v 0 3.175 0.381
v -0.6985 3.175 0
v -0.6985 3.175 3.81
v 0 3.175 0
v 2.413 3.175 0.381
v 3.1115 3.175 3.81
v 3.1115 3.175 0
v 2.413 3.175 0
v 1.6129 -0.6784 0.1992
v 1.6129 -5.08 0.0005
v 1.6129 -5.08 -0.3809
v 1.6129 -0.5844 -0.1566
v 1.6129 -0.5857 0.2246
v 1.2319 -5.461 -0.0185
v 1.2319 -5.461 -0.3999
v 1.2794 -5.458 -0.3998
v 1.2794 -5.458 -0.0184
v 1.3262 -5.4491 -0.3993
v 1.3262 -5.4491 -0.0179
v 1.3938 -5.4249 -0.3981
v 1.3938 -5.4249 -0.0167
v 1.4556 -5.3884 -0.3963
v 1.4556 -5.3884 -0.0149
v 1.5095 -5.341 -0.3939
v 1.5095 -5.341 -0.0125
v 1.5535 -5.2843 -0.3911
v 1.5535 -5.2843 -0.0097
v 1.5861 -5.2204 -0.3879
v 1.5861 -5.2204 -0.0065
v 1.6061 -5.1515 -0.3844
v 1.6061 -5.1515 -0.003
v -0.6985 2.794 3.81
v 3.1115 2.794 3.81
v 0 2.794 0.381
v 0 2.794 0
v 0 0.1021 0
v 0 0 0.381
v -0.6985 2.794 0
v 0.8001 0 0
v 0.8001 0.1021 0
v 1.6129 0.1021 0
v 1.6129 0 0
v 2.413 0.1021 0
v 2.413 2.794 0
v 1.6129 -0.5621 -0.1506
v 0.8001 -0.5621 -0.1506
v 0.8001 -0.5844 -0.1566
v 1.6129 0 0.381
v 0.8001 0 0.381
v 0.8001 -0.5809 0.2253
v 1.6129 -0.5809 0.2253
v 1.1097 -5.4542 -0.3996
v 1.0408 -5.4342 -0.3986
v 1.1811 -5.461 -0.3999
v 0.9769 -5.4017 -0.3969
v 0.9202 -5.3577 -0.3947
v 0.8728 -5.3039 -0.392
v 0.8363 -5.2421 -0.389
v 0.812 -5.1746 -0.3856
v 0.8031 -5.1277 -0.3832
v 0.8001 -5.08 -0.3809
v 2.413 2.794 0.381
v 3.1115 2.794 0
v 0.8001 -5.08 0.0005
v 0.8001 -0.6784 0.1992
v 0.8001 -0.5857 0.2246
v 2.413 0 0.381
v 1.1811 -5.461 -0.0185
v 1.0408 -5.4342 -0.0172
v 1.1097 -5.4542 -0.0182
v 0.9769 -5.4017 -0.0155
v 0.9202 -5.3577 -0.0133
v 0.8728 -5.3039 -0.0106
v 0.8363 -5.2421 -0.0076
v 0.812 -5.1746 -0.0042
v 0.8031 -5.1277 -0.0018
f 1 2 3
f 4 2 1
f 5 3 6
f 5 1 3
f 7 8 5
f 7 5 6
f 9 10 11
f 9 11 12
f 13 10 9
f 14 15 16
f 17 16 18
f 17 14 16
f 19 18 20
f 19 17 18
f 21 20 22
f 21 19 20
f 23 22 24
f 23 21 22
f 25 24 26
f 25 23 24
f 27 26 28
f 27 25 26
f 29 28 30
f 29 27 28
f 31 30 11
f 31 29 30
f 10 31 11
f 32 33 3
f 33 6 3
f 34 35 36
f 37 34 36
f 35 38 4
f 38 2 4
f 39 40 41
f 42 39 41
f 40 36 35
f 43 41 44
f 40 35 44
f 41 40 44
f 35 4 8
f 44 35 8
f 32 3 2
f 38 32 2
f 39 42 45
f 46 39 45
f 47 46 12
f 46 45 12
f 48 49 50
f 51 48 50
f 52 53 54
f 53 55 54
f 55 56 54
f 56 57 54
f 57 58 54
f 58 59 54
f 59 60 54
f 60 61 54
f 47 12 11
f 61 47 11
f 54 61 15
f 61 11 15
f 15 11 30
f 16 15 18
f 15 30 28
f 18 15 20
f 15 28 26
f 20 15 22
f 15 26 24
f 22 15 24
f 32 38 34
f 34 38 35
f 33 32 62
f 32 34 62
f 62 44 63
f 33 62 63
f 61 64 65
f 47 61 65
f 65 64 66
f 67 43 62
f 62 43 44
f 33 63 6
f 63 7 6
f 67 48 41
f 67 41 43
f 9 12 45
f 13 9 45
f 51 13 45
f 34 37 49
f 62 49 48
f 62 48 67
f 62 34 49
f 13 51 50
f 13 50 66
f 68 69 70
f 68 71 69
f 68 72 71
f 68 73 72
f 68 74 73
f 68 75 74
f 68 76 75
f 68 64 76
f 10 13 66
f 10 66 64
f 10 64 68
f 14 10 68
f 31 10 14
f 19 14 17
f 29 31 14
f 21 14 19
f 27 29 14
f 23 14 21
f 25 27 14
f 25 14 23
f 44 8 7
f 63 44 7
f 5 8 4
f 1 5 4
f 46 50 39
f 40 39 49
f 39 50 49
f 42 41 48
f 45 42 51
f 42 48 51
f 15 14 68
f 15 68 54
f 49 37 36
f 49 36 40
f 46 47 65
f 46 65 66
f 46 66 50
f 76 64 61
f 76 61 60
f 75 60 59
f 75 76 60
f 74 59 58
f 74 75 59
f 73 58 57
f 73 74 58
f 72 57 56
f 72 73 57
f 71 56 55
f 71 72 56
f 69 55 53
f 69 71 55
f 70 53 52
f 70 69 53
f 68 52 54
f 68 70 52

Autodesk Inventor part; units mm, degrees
ref_plane "YZ Plane" through (0, 0, 0) normal (1, 0, 0) x (0, 1, 0)
ref_plane "XZ Plane" through (0, 0, 0) normal (0, 1, 0) x (-1, 0, 0)
ref_plane "XY Plane" through (0, 0, 0) normal (0, 0, 1) x (1, 0, 0)
sketch "Sketch1" plane through (0, 0, 0) normal (0, 0, 1) x (1, 0, 0)
  line L0 (0, 0) -> (2.413, 0)
  line L1 (2.413, 0) -> (2.413, 3.175)
  line L2 (2.413, 3.175) -> (0, 3.175)
  line L3 (0, 3.175) -> (0, 0)
  dimension "d0" = 2.413
  dimension "d1" = 3.175
extrude "Extrusion1" add sketch "Sketch1" along normal blind 0.381
sketch "Sketch2" plane through (2.413, 0, 0) normal (1, 0, 0) x (0, 0, -1)
  line L0 (0, 3.175) -> (-0.381, 3.175) projected
  line L1 (0, 0) -> (-0.381, 0) projected
  line L2 (-0.381, 0) -> (-0.2241, -0.5857)
  line L3 (0, 0) -> (0.1569, -0.5857)
  line L4 (-0.2253, -0.5809) -> (0.0185, -5.461)
  line L5 (0.1562, -0.5831) -> (0.3999, -5.461)
  line L6 (-0.381, 0) -> (-0.381, 3.175) projected
  line L7 (0.0185, -5.461) -> (0.3999, -5.461)
  dimension "d5" = 0.381
  dimension "d6" = 8.636
extrude "Extrusion2" add sketch "Sketch2" against normal up to surface (2.413 mm away)
sketch "Sketch3" plane through (2.413, -5.461, -0.0185) normal (0, -0.0499, 0.9988) x (1, 0, 0)
  line L0 (-2.413, 4.8862) -> (-2.413, 0) projected
  line L1 (0, 4.8862) -> (-2.413, 4.8862) projected
  line L2 (-2.413, 5.4741) -> (0, 5.4741) projected
  line L3 (-2.413, -0.5509) -> (-1.6129, -0.5509)
  line L4 (-1.6129, -0.5509) -> (-1.6129, 4.8862)
  line L5 (-1.6129, 5.4741) -> (-2.413, 5.4741)
  line L6 (-2.413, 4.8862) -> (-2.413, -0.5509)
  line L7 (-0.4584, 5.4741) -> (0, 5.4741)
  line L8 (0, 5.4741) -> (0, 0)
  line L9 (-0.8001, -0.511) -> (0, -0.511)
  line L10 (-0.8001, -0.511) -> (-0.8001, 4.8862)
  line L11 (0, 4.8862) -> (0, -0.511)
  line L12 (-0.8001, 4.8862) -> (0, 4.8862)
  line L13 (-1.6129, 4.8862) -> (-2.413, 4.8862)
  point P0 (-2.413, 5.4551)
  dimension "d9" = 0.8128
  dimension "d10" = 2.413
  dimension "d11" = 0.8001
extrude "Extrusion3" cut sketch "Sketch3" against normal through all
sketch "Sketch4" plane through (0, 0, 0.381) normal (0, -0.2588, 0.9659) x (1, 0, 0)
  line L0 (0, 0) -> (2.413, 0) projected
  line L1 (1.6129, -0.7023) -> (2.413, -0.7023)
  line L2 (2.413, -0.7023) -> (2.413, 0)
  line L3 (2.413, 0) -> (1.6129, 0)
  line L4 (1.6129, 0) -> (1.6129, -0.7023)
  line L5 (0, -0.7023) -> (0.8001, -0.7023)
  line L6 (0.8001, -0.7023) -> (0.8001, 0)
  line L7 (0.8001, 0) -> (0, 0)
  line L8 (0, 0) -> (0, -0.7023)
  point P0 (0, -0.0986)
extrude "Extrusion4" cut sketch "Sketch4" against normal through all
sketch "Sketch5" plane through (0, 3.175, 0) normal (0, 1, 0) x (1, 0, 0)
  line L0 (2.413, 0) -> (0, 0) projected
  line L1 (0, 0) -> (0, -0.381) projected
  line L2 (2.413, -0.381) -> (0, -0.381) projected
  line L3 (2.413, 0) -> (2.413, -0.381) projected
  line L4 (-0.6985, 0) -> (3.1115, 0)
  line L5 (3.1115, 0) -> (3.1115, -3.81)
  line L6 (3.1115, -3.81) -> (-0.6985, -3.81)
  line L7 (-0.6985, -3.81) -> (-0.6985, 0)
  dimension "d16" = 3.81
  dimension "d17" = 3.81
  dimension "d18" = 2.413
  dimension "d19" = 0.6985
extrude "Extrusion5" add sketch "Sketch5" against normal blind 0.381 contours L4 L5 L6 L7 L1 L2 L3
fillet "Fillet1" radius 0.381 2 edges at (0.8001, -5.461, -0.2092) (1.6129, -5.461, -0.2092)
equation "\"d11\" = -0.5 * d9 + 0.5 * d10"
equation "\"d19\" = -0.5 * d18 + 0.5 * d16"
properties part number "pin_2"
